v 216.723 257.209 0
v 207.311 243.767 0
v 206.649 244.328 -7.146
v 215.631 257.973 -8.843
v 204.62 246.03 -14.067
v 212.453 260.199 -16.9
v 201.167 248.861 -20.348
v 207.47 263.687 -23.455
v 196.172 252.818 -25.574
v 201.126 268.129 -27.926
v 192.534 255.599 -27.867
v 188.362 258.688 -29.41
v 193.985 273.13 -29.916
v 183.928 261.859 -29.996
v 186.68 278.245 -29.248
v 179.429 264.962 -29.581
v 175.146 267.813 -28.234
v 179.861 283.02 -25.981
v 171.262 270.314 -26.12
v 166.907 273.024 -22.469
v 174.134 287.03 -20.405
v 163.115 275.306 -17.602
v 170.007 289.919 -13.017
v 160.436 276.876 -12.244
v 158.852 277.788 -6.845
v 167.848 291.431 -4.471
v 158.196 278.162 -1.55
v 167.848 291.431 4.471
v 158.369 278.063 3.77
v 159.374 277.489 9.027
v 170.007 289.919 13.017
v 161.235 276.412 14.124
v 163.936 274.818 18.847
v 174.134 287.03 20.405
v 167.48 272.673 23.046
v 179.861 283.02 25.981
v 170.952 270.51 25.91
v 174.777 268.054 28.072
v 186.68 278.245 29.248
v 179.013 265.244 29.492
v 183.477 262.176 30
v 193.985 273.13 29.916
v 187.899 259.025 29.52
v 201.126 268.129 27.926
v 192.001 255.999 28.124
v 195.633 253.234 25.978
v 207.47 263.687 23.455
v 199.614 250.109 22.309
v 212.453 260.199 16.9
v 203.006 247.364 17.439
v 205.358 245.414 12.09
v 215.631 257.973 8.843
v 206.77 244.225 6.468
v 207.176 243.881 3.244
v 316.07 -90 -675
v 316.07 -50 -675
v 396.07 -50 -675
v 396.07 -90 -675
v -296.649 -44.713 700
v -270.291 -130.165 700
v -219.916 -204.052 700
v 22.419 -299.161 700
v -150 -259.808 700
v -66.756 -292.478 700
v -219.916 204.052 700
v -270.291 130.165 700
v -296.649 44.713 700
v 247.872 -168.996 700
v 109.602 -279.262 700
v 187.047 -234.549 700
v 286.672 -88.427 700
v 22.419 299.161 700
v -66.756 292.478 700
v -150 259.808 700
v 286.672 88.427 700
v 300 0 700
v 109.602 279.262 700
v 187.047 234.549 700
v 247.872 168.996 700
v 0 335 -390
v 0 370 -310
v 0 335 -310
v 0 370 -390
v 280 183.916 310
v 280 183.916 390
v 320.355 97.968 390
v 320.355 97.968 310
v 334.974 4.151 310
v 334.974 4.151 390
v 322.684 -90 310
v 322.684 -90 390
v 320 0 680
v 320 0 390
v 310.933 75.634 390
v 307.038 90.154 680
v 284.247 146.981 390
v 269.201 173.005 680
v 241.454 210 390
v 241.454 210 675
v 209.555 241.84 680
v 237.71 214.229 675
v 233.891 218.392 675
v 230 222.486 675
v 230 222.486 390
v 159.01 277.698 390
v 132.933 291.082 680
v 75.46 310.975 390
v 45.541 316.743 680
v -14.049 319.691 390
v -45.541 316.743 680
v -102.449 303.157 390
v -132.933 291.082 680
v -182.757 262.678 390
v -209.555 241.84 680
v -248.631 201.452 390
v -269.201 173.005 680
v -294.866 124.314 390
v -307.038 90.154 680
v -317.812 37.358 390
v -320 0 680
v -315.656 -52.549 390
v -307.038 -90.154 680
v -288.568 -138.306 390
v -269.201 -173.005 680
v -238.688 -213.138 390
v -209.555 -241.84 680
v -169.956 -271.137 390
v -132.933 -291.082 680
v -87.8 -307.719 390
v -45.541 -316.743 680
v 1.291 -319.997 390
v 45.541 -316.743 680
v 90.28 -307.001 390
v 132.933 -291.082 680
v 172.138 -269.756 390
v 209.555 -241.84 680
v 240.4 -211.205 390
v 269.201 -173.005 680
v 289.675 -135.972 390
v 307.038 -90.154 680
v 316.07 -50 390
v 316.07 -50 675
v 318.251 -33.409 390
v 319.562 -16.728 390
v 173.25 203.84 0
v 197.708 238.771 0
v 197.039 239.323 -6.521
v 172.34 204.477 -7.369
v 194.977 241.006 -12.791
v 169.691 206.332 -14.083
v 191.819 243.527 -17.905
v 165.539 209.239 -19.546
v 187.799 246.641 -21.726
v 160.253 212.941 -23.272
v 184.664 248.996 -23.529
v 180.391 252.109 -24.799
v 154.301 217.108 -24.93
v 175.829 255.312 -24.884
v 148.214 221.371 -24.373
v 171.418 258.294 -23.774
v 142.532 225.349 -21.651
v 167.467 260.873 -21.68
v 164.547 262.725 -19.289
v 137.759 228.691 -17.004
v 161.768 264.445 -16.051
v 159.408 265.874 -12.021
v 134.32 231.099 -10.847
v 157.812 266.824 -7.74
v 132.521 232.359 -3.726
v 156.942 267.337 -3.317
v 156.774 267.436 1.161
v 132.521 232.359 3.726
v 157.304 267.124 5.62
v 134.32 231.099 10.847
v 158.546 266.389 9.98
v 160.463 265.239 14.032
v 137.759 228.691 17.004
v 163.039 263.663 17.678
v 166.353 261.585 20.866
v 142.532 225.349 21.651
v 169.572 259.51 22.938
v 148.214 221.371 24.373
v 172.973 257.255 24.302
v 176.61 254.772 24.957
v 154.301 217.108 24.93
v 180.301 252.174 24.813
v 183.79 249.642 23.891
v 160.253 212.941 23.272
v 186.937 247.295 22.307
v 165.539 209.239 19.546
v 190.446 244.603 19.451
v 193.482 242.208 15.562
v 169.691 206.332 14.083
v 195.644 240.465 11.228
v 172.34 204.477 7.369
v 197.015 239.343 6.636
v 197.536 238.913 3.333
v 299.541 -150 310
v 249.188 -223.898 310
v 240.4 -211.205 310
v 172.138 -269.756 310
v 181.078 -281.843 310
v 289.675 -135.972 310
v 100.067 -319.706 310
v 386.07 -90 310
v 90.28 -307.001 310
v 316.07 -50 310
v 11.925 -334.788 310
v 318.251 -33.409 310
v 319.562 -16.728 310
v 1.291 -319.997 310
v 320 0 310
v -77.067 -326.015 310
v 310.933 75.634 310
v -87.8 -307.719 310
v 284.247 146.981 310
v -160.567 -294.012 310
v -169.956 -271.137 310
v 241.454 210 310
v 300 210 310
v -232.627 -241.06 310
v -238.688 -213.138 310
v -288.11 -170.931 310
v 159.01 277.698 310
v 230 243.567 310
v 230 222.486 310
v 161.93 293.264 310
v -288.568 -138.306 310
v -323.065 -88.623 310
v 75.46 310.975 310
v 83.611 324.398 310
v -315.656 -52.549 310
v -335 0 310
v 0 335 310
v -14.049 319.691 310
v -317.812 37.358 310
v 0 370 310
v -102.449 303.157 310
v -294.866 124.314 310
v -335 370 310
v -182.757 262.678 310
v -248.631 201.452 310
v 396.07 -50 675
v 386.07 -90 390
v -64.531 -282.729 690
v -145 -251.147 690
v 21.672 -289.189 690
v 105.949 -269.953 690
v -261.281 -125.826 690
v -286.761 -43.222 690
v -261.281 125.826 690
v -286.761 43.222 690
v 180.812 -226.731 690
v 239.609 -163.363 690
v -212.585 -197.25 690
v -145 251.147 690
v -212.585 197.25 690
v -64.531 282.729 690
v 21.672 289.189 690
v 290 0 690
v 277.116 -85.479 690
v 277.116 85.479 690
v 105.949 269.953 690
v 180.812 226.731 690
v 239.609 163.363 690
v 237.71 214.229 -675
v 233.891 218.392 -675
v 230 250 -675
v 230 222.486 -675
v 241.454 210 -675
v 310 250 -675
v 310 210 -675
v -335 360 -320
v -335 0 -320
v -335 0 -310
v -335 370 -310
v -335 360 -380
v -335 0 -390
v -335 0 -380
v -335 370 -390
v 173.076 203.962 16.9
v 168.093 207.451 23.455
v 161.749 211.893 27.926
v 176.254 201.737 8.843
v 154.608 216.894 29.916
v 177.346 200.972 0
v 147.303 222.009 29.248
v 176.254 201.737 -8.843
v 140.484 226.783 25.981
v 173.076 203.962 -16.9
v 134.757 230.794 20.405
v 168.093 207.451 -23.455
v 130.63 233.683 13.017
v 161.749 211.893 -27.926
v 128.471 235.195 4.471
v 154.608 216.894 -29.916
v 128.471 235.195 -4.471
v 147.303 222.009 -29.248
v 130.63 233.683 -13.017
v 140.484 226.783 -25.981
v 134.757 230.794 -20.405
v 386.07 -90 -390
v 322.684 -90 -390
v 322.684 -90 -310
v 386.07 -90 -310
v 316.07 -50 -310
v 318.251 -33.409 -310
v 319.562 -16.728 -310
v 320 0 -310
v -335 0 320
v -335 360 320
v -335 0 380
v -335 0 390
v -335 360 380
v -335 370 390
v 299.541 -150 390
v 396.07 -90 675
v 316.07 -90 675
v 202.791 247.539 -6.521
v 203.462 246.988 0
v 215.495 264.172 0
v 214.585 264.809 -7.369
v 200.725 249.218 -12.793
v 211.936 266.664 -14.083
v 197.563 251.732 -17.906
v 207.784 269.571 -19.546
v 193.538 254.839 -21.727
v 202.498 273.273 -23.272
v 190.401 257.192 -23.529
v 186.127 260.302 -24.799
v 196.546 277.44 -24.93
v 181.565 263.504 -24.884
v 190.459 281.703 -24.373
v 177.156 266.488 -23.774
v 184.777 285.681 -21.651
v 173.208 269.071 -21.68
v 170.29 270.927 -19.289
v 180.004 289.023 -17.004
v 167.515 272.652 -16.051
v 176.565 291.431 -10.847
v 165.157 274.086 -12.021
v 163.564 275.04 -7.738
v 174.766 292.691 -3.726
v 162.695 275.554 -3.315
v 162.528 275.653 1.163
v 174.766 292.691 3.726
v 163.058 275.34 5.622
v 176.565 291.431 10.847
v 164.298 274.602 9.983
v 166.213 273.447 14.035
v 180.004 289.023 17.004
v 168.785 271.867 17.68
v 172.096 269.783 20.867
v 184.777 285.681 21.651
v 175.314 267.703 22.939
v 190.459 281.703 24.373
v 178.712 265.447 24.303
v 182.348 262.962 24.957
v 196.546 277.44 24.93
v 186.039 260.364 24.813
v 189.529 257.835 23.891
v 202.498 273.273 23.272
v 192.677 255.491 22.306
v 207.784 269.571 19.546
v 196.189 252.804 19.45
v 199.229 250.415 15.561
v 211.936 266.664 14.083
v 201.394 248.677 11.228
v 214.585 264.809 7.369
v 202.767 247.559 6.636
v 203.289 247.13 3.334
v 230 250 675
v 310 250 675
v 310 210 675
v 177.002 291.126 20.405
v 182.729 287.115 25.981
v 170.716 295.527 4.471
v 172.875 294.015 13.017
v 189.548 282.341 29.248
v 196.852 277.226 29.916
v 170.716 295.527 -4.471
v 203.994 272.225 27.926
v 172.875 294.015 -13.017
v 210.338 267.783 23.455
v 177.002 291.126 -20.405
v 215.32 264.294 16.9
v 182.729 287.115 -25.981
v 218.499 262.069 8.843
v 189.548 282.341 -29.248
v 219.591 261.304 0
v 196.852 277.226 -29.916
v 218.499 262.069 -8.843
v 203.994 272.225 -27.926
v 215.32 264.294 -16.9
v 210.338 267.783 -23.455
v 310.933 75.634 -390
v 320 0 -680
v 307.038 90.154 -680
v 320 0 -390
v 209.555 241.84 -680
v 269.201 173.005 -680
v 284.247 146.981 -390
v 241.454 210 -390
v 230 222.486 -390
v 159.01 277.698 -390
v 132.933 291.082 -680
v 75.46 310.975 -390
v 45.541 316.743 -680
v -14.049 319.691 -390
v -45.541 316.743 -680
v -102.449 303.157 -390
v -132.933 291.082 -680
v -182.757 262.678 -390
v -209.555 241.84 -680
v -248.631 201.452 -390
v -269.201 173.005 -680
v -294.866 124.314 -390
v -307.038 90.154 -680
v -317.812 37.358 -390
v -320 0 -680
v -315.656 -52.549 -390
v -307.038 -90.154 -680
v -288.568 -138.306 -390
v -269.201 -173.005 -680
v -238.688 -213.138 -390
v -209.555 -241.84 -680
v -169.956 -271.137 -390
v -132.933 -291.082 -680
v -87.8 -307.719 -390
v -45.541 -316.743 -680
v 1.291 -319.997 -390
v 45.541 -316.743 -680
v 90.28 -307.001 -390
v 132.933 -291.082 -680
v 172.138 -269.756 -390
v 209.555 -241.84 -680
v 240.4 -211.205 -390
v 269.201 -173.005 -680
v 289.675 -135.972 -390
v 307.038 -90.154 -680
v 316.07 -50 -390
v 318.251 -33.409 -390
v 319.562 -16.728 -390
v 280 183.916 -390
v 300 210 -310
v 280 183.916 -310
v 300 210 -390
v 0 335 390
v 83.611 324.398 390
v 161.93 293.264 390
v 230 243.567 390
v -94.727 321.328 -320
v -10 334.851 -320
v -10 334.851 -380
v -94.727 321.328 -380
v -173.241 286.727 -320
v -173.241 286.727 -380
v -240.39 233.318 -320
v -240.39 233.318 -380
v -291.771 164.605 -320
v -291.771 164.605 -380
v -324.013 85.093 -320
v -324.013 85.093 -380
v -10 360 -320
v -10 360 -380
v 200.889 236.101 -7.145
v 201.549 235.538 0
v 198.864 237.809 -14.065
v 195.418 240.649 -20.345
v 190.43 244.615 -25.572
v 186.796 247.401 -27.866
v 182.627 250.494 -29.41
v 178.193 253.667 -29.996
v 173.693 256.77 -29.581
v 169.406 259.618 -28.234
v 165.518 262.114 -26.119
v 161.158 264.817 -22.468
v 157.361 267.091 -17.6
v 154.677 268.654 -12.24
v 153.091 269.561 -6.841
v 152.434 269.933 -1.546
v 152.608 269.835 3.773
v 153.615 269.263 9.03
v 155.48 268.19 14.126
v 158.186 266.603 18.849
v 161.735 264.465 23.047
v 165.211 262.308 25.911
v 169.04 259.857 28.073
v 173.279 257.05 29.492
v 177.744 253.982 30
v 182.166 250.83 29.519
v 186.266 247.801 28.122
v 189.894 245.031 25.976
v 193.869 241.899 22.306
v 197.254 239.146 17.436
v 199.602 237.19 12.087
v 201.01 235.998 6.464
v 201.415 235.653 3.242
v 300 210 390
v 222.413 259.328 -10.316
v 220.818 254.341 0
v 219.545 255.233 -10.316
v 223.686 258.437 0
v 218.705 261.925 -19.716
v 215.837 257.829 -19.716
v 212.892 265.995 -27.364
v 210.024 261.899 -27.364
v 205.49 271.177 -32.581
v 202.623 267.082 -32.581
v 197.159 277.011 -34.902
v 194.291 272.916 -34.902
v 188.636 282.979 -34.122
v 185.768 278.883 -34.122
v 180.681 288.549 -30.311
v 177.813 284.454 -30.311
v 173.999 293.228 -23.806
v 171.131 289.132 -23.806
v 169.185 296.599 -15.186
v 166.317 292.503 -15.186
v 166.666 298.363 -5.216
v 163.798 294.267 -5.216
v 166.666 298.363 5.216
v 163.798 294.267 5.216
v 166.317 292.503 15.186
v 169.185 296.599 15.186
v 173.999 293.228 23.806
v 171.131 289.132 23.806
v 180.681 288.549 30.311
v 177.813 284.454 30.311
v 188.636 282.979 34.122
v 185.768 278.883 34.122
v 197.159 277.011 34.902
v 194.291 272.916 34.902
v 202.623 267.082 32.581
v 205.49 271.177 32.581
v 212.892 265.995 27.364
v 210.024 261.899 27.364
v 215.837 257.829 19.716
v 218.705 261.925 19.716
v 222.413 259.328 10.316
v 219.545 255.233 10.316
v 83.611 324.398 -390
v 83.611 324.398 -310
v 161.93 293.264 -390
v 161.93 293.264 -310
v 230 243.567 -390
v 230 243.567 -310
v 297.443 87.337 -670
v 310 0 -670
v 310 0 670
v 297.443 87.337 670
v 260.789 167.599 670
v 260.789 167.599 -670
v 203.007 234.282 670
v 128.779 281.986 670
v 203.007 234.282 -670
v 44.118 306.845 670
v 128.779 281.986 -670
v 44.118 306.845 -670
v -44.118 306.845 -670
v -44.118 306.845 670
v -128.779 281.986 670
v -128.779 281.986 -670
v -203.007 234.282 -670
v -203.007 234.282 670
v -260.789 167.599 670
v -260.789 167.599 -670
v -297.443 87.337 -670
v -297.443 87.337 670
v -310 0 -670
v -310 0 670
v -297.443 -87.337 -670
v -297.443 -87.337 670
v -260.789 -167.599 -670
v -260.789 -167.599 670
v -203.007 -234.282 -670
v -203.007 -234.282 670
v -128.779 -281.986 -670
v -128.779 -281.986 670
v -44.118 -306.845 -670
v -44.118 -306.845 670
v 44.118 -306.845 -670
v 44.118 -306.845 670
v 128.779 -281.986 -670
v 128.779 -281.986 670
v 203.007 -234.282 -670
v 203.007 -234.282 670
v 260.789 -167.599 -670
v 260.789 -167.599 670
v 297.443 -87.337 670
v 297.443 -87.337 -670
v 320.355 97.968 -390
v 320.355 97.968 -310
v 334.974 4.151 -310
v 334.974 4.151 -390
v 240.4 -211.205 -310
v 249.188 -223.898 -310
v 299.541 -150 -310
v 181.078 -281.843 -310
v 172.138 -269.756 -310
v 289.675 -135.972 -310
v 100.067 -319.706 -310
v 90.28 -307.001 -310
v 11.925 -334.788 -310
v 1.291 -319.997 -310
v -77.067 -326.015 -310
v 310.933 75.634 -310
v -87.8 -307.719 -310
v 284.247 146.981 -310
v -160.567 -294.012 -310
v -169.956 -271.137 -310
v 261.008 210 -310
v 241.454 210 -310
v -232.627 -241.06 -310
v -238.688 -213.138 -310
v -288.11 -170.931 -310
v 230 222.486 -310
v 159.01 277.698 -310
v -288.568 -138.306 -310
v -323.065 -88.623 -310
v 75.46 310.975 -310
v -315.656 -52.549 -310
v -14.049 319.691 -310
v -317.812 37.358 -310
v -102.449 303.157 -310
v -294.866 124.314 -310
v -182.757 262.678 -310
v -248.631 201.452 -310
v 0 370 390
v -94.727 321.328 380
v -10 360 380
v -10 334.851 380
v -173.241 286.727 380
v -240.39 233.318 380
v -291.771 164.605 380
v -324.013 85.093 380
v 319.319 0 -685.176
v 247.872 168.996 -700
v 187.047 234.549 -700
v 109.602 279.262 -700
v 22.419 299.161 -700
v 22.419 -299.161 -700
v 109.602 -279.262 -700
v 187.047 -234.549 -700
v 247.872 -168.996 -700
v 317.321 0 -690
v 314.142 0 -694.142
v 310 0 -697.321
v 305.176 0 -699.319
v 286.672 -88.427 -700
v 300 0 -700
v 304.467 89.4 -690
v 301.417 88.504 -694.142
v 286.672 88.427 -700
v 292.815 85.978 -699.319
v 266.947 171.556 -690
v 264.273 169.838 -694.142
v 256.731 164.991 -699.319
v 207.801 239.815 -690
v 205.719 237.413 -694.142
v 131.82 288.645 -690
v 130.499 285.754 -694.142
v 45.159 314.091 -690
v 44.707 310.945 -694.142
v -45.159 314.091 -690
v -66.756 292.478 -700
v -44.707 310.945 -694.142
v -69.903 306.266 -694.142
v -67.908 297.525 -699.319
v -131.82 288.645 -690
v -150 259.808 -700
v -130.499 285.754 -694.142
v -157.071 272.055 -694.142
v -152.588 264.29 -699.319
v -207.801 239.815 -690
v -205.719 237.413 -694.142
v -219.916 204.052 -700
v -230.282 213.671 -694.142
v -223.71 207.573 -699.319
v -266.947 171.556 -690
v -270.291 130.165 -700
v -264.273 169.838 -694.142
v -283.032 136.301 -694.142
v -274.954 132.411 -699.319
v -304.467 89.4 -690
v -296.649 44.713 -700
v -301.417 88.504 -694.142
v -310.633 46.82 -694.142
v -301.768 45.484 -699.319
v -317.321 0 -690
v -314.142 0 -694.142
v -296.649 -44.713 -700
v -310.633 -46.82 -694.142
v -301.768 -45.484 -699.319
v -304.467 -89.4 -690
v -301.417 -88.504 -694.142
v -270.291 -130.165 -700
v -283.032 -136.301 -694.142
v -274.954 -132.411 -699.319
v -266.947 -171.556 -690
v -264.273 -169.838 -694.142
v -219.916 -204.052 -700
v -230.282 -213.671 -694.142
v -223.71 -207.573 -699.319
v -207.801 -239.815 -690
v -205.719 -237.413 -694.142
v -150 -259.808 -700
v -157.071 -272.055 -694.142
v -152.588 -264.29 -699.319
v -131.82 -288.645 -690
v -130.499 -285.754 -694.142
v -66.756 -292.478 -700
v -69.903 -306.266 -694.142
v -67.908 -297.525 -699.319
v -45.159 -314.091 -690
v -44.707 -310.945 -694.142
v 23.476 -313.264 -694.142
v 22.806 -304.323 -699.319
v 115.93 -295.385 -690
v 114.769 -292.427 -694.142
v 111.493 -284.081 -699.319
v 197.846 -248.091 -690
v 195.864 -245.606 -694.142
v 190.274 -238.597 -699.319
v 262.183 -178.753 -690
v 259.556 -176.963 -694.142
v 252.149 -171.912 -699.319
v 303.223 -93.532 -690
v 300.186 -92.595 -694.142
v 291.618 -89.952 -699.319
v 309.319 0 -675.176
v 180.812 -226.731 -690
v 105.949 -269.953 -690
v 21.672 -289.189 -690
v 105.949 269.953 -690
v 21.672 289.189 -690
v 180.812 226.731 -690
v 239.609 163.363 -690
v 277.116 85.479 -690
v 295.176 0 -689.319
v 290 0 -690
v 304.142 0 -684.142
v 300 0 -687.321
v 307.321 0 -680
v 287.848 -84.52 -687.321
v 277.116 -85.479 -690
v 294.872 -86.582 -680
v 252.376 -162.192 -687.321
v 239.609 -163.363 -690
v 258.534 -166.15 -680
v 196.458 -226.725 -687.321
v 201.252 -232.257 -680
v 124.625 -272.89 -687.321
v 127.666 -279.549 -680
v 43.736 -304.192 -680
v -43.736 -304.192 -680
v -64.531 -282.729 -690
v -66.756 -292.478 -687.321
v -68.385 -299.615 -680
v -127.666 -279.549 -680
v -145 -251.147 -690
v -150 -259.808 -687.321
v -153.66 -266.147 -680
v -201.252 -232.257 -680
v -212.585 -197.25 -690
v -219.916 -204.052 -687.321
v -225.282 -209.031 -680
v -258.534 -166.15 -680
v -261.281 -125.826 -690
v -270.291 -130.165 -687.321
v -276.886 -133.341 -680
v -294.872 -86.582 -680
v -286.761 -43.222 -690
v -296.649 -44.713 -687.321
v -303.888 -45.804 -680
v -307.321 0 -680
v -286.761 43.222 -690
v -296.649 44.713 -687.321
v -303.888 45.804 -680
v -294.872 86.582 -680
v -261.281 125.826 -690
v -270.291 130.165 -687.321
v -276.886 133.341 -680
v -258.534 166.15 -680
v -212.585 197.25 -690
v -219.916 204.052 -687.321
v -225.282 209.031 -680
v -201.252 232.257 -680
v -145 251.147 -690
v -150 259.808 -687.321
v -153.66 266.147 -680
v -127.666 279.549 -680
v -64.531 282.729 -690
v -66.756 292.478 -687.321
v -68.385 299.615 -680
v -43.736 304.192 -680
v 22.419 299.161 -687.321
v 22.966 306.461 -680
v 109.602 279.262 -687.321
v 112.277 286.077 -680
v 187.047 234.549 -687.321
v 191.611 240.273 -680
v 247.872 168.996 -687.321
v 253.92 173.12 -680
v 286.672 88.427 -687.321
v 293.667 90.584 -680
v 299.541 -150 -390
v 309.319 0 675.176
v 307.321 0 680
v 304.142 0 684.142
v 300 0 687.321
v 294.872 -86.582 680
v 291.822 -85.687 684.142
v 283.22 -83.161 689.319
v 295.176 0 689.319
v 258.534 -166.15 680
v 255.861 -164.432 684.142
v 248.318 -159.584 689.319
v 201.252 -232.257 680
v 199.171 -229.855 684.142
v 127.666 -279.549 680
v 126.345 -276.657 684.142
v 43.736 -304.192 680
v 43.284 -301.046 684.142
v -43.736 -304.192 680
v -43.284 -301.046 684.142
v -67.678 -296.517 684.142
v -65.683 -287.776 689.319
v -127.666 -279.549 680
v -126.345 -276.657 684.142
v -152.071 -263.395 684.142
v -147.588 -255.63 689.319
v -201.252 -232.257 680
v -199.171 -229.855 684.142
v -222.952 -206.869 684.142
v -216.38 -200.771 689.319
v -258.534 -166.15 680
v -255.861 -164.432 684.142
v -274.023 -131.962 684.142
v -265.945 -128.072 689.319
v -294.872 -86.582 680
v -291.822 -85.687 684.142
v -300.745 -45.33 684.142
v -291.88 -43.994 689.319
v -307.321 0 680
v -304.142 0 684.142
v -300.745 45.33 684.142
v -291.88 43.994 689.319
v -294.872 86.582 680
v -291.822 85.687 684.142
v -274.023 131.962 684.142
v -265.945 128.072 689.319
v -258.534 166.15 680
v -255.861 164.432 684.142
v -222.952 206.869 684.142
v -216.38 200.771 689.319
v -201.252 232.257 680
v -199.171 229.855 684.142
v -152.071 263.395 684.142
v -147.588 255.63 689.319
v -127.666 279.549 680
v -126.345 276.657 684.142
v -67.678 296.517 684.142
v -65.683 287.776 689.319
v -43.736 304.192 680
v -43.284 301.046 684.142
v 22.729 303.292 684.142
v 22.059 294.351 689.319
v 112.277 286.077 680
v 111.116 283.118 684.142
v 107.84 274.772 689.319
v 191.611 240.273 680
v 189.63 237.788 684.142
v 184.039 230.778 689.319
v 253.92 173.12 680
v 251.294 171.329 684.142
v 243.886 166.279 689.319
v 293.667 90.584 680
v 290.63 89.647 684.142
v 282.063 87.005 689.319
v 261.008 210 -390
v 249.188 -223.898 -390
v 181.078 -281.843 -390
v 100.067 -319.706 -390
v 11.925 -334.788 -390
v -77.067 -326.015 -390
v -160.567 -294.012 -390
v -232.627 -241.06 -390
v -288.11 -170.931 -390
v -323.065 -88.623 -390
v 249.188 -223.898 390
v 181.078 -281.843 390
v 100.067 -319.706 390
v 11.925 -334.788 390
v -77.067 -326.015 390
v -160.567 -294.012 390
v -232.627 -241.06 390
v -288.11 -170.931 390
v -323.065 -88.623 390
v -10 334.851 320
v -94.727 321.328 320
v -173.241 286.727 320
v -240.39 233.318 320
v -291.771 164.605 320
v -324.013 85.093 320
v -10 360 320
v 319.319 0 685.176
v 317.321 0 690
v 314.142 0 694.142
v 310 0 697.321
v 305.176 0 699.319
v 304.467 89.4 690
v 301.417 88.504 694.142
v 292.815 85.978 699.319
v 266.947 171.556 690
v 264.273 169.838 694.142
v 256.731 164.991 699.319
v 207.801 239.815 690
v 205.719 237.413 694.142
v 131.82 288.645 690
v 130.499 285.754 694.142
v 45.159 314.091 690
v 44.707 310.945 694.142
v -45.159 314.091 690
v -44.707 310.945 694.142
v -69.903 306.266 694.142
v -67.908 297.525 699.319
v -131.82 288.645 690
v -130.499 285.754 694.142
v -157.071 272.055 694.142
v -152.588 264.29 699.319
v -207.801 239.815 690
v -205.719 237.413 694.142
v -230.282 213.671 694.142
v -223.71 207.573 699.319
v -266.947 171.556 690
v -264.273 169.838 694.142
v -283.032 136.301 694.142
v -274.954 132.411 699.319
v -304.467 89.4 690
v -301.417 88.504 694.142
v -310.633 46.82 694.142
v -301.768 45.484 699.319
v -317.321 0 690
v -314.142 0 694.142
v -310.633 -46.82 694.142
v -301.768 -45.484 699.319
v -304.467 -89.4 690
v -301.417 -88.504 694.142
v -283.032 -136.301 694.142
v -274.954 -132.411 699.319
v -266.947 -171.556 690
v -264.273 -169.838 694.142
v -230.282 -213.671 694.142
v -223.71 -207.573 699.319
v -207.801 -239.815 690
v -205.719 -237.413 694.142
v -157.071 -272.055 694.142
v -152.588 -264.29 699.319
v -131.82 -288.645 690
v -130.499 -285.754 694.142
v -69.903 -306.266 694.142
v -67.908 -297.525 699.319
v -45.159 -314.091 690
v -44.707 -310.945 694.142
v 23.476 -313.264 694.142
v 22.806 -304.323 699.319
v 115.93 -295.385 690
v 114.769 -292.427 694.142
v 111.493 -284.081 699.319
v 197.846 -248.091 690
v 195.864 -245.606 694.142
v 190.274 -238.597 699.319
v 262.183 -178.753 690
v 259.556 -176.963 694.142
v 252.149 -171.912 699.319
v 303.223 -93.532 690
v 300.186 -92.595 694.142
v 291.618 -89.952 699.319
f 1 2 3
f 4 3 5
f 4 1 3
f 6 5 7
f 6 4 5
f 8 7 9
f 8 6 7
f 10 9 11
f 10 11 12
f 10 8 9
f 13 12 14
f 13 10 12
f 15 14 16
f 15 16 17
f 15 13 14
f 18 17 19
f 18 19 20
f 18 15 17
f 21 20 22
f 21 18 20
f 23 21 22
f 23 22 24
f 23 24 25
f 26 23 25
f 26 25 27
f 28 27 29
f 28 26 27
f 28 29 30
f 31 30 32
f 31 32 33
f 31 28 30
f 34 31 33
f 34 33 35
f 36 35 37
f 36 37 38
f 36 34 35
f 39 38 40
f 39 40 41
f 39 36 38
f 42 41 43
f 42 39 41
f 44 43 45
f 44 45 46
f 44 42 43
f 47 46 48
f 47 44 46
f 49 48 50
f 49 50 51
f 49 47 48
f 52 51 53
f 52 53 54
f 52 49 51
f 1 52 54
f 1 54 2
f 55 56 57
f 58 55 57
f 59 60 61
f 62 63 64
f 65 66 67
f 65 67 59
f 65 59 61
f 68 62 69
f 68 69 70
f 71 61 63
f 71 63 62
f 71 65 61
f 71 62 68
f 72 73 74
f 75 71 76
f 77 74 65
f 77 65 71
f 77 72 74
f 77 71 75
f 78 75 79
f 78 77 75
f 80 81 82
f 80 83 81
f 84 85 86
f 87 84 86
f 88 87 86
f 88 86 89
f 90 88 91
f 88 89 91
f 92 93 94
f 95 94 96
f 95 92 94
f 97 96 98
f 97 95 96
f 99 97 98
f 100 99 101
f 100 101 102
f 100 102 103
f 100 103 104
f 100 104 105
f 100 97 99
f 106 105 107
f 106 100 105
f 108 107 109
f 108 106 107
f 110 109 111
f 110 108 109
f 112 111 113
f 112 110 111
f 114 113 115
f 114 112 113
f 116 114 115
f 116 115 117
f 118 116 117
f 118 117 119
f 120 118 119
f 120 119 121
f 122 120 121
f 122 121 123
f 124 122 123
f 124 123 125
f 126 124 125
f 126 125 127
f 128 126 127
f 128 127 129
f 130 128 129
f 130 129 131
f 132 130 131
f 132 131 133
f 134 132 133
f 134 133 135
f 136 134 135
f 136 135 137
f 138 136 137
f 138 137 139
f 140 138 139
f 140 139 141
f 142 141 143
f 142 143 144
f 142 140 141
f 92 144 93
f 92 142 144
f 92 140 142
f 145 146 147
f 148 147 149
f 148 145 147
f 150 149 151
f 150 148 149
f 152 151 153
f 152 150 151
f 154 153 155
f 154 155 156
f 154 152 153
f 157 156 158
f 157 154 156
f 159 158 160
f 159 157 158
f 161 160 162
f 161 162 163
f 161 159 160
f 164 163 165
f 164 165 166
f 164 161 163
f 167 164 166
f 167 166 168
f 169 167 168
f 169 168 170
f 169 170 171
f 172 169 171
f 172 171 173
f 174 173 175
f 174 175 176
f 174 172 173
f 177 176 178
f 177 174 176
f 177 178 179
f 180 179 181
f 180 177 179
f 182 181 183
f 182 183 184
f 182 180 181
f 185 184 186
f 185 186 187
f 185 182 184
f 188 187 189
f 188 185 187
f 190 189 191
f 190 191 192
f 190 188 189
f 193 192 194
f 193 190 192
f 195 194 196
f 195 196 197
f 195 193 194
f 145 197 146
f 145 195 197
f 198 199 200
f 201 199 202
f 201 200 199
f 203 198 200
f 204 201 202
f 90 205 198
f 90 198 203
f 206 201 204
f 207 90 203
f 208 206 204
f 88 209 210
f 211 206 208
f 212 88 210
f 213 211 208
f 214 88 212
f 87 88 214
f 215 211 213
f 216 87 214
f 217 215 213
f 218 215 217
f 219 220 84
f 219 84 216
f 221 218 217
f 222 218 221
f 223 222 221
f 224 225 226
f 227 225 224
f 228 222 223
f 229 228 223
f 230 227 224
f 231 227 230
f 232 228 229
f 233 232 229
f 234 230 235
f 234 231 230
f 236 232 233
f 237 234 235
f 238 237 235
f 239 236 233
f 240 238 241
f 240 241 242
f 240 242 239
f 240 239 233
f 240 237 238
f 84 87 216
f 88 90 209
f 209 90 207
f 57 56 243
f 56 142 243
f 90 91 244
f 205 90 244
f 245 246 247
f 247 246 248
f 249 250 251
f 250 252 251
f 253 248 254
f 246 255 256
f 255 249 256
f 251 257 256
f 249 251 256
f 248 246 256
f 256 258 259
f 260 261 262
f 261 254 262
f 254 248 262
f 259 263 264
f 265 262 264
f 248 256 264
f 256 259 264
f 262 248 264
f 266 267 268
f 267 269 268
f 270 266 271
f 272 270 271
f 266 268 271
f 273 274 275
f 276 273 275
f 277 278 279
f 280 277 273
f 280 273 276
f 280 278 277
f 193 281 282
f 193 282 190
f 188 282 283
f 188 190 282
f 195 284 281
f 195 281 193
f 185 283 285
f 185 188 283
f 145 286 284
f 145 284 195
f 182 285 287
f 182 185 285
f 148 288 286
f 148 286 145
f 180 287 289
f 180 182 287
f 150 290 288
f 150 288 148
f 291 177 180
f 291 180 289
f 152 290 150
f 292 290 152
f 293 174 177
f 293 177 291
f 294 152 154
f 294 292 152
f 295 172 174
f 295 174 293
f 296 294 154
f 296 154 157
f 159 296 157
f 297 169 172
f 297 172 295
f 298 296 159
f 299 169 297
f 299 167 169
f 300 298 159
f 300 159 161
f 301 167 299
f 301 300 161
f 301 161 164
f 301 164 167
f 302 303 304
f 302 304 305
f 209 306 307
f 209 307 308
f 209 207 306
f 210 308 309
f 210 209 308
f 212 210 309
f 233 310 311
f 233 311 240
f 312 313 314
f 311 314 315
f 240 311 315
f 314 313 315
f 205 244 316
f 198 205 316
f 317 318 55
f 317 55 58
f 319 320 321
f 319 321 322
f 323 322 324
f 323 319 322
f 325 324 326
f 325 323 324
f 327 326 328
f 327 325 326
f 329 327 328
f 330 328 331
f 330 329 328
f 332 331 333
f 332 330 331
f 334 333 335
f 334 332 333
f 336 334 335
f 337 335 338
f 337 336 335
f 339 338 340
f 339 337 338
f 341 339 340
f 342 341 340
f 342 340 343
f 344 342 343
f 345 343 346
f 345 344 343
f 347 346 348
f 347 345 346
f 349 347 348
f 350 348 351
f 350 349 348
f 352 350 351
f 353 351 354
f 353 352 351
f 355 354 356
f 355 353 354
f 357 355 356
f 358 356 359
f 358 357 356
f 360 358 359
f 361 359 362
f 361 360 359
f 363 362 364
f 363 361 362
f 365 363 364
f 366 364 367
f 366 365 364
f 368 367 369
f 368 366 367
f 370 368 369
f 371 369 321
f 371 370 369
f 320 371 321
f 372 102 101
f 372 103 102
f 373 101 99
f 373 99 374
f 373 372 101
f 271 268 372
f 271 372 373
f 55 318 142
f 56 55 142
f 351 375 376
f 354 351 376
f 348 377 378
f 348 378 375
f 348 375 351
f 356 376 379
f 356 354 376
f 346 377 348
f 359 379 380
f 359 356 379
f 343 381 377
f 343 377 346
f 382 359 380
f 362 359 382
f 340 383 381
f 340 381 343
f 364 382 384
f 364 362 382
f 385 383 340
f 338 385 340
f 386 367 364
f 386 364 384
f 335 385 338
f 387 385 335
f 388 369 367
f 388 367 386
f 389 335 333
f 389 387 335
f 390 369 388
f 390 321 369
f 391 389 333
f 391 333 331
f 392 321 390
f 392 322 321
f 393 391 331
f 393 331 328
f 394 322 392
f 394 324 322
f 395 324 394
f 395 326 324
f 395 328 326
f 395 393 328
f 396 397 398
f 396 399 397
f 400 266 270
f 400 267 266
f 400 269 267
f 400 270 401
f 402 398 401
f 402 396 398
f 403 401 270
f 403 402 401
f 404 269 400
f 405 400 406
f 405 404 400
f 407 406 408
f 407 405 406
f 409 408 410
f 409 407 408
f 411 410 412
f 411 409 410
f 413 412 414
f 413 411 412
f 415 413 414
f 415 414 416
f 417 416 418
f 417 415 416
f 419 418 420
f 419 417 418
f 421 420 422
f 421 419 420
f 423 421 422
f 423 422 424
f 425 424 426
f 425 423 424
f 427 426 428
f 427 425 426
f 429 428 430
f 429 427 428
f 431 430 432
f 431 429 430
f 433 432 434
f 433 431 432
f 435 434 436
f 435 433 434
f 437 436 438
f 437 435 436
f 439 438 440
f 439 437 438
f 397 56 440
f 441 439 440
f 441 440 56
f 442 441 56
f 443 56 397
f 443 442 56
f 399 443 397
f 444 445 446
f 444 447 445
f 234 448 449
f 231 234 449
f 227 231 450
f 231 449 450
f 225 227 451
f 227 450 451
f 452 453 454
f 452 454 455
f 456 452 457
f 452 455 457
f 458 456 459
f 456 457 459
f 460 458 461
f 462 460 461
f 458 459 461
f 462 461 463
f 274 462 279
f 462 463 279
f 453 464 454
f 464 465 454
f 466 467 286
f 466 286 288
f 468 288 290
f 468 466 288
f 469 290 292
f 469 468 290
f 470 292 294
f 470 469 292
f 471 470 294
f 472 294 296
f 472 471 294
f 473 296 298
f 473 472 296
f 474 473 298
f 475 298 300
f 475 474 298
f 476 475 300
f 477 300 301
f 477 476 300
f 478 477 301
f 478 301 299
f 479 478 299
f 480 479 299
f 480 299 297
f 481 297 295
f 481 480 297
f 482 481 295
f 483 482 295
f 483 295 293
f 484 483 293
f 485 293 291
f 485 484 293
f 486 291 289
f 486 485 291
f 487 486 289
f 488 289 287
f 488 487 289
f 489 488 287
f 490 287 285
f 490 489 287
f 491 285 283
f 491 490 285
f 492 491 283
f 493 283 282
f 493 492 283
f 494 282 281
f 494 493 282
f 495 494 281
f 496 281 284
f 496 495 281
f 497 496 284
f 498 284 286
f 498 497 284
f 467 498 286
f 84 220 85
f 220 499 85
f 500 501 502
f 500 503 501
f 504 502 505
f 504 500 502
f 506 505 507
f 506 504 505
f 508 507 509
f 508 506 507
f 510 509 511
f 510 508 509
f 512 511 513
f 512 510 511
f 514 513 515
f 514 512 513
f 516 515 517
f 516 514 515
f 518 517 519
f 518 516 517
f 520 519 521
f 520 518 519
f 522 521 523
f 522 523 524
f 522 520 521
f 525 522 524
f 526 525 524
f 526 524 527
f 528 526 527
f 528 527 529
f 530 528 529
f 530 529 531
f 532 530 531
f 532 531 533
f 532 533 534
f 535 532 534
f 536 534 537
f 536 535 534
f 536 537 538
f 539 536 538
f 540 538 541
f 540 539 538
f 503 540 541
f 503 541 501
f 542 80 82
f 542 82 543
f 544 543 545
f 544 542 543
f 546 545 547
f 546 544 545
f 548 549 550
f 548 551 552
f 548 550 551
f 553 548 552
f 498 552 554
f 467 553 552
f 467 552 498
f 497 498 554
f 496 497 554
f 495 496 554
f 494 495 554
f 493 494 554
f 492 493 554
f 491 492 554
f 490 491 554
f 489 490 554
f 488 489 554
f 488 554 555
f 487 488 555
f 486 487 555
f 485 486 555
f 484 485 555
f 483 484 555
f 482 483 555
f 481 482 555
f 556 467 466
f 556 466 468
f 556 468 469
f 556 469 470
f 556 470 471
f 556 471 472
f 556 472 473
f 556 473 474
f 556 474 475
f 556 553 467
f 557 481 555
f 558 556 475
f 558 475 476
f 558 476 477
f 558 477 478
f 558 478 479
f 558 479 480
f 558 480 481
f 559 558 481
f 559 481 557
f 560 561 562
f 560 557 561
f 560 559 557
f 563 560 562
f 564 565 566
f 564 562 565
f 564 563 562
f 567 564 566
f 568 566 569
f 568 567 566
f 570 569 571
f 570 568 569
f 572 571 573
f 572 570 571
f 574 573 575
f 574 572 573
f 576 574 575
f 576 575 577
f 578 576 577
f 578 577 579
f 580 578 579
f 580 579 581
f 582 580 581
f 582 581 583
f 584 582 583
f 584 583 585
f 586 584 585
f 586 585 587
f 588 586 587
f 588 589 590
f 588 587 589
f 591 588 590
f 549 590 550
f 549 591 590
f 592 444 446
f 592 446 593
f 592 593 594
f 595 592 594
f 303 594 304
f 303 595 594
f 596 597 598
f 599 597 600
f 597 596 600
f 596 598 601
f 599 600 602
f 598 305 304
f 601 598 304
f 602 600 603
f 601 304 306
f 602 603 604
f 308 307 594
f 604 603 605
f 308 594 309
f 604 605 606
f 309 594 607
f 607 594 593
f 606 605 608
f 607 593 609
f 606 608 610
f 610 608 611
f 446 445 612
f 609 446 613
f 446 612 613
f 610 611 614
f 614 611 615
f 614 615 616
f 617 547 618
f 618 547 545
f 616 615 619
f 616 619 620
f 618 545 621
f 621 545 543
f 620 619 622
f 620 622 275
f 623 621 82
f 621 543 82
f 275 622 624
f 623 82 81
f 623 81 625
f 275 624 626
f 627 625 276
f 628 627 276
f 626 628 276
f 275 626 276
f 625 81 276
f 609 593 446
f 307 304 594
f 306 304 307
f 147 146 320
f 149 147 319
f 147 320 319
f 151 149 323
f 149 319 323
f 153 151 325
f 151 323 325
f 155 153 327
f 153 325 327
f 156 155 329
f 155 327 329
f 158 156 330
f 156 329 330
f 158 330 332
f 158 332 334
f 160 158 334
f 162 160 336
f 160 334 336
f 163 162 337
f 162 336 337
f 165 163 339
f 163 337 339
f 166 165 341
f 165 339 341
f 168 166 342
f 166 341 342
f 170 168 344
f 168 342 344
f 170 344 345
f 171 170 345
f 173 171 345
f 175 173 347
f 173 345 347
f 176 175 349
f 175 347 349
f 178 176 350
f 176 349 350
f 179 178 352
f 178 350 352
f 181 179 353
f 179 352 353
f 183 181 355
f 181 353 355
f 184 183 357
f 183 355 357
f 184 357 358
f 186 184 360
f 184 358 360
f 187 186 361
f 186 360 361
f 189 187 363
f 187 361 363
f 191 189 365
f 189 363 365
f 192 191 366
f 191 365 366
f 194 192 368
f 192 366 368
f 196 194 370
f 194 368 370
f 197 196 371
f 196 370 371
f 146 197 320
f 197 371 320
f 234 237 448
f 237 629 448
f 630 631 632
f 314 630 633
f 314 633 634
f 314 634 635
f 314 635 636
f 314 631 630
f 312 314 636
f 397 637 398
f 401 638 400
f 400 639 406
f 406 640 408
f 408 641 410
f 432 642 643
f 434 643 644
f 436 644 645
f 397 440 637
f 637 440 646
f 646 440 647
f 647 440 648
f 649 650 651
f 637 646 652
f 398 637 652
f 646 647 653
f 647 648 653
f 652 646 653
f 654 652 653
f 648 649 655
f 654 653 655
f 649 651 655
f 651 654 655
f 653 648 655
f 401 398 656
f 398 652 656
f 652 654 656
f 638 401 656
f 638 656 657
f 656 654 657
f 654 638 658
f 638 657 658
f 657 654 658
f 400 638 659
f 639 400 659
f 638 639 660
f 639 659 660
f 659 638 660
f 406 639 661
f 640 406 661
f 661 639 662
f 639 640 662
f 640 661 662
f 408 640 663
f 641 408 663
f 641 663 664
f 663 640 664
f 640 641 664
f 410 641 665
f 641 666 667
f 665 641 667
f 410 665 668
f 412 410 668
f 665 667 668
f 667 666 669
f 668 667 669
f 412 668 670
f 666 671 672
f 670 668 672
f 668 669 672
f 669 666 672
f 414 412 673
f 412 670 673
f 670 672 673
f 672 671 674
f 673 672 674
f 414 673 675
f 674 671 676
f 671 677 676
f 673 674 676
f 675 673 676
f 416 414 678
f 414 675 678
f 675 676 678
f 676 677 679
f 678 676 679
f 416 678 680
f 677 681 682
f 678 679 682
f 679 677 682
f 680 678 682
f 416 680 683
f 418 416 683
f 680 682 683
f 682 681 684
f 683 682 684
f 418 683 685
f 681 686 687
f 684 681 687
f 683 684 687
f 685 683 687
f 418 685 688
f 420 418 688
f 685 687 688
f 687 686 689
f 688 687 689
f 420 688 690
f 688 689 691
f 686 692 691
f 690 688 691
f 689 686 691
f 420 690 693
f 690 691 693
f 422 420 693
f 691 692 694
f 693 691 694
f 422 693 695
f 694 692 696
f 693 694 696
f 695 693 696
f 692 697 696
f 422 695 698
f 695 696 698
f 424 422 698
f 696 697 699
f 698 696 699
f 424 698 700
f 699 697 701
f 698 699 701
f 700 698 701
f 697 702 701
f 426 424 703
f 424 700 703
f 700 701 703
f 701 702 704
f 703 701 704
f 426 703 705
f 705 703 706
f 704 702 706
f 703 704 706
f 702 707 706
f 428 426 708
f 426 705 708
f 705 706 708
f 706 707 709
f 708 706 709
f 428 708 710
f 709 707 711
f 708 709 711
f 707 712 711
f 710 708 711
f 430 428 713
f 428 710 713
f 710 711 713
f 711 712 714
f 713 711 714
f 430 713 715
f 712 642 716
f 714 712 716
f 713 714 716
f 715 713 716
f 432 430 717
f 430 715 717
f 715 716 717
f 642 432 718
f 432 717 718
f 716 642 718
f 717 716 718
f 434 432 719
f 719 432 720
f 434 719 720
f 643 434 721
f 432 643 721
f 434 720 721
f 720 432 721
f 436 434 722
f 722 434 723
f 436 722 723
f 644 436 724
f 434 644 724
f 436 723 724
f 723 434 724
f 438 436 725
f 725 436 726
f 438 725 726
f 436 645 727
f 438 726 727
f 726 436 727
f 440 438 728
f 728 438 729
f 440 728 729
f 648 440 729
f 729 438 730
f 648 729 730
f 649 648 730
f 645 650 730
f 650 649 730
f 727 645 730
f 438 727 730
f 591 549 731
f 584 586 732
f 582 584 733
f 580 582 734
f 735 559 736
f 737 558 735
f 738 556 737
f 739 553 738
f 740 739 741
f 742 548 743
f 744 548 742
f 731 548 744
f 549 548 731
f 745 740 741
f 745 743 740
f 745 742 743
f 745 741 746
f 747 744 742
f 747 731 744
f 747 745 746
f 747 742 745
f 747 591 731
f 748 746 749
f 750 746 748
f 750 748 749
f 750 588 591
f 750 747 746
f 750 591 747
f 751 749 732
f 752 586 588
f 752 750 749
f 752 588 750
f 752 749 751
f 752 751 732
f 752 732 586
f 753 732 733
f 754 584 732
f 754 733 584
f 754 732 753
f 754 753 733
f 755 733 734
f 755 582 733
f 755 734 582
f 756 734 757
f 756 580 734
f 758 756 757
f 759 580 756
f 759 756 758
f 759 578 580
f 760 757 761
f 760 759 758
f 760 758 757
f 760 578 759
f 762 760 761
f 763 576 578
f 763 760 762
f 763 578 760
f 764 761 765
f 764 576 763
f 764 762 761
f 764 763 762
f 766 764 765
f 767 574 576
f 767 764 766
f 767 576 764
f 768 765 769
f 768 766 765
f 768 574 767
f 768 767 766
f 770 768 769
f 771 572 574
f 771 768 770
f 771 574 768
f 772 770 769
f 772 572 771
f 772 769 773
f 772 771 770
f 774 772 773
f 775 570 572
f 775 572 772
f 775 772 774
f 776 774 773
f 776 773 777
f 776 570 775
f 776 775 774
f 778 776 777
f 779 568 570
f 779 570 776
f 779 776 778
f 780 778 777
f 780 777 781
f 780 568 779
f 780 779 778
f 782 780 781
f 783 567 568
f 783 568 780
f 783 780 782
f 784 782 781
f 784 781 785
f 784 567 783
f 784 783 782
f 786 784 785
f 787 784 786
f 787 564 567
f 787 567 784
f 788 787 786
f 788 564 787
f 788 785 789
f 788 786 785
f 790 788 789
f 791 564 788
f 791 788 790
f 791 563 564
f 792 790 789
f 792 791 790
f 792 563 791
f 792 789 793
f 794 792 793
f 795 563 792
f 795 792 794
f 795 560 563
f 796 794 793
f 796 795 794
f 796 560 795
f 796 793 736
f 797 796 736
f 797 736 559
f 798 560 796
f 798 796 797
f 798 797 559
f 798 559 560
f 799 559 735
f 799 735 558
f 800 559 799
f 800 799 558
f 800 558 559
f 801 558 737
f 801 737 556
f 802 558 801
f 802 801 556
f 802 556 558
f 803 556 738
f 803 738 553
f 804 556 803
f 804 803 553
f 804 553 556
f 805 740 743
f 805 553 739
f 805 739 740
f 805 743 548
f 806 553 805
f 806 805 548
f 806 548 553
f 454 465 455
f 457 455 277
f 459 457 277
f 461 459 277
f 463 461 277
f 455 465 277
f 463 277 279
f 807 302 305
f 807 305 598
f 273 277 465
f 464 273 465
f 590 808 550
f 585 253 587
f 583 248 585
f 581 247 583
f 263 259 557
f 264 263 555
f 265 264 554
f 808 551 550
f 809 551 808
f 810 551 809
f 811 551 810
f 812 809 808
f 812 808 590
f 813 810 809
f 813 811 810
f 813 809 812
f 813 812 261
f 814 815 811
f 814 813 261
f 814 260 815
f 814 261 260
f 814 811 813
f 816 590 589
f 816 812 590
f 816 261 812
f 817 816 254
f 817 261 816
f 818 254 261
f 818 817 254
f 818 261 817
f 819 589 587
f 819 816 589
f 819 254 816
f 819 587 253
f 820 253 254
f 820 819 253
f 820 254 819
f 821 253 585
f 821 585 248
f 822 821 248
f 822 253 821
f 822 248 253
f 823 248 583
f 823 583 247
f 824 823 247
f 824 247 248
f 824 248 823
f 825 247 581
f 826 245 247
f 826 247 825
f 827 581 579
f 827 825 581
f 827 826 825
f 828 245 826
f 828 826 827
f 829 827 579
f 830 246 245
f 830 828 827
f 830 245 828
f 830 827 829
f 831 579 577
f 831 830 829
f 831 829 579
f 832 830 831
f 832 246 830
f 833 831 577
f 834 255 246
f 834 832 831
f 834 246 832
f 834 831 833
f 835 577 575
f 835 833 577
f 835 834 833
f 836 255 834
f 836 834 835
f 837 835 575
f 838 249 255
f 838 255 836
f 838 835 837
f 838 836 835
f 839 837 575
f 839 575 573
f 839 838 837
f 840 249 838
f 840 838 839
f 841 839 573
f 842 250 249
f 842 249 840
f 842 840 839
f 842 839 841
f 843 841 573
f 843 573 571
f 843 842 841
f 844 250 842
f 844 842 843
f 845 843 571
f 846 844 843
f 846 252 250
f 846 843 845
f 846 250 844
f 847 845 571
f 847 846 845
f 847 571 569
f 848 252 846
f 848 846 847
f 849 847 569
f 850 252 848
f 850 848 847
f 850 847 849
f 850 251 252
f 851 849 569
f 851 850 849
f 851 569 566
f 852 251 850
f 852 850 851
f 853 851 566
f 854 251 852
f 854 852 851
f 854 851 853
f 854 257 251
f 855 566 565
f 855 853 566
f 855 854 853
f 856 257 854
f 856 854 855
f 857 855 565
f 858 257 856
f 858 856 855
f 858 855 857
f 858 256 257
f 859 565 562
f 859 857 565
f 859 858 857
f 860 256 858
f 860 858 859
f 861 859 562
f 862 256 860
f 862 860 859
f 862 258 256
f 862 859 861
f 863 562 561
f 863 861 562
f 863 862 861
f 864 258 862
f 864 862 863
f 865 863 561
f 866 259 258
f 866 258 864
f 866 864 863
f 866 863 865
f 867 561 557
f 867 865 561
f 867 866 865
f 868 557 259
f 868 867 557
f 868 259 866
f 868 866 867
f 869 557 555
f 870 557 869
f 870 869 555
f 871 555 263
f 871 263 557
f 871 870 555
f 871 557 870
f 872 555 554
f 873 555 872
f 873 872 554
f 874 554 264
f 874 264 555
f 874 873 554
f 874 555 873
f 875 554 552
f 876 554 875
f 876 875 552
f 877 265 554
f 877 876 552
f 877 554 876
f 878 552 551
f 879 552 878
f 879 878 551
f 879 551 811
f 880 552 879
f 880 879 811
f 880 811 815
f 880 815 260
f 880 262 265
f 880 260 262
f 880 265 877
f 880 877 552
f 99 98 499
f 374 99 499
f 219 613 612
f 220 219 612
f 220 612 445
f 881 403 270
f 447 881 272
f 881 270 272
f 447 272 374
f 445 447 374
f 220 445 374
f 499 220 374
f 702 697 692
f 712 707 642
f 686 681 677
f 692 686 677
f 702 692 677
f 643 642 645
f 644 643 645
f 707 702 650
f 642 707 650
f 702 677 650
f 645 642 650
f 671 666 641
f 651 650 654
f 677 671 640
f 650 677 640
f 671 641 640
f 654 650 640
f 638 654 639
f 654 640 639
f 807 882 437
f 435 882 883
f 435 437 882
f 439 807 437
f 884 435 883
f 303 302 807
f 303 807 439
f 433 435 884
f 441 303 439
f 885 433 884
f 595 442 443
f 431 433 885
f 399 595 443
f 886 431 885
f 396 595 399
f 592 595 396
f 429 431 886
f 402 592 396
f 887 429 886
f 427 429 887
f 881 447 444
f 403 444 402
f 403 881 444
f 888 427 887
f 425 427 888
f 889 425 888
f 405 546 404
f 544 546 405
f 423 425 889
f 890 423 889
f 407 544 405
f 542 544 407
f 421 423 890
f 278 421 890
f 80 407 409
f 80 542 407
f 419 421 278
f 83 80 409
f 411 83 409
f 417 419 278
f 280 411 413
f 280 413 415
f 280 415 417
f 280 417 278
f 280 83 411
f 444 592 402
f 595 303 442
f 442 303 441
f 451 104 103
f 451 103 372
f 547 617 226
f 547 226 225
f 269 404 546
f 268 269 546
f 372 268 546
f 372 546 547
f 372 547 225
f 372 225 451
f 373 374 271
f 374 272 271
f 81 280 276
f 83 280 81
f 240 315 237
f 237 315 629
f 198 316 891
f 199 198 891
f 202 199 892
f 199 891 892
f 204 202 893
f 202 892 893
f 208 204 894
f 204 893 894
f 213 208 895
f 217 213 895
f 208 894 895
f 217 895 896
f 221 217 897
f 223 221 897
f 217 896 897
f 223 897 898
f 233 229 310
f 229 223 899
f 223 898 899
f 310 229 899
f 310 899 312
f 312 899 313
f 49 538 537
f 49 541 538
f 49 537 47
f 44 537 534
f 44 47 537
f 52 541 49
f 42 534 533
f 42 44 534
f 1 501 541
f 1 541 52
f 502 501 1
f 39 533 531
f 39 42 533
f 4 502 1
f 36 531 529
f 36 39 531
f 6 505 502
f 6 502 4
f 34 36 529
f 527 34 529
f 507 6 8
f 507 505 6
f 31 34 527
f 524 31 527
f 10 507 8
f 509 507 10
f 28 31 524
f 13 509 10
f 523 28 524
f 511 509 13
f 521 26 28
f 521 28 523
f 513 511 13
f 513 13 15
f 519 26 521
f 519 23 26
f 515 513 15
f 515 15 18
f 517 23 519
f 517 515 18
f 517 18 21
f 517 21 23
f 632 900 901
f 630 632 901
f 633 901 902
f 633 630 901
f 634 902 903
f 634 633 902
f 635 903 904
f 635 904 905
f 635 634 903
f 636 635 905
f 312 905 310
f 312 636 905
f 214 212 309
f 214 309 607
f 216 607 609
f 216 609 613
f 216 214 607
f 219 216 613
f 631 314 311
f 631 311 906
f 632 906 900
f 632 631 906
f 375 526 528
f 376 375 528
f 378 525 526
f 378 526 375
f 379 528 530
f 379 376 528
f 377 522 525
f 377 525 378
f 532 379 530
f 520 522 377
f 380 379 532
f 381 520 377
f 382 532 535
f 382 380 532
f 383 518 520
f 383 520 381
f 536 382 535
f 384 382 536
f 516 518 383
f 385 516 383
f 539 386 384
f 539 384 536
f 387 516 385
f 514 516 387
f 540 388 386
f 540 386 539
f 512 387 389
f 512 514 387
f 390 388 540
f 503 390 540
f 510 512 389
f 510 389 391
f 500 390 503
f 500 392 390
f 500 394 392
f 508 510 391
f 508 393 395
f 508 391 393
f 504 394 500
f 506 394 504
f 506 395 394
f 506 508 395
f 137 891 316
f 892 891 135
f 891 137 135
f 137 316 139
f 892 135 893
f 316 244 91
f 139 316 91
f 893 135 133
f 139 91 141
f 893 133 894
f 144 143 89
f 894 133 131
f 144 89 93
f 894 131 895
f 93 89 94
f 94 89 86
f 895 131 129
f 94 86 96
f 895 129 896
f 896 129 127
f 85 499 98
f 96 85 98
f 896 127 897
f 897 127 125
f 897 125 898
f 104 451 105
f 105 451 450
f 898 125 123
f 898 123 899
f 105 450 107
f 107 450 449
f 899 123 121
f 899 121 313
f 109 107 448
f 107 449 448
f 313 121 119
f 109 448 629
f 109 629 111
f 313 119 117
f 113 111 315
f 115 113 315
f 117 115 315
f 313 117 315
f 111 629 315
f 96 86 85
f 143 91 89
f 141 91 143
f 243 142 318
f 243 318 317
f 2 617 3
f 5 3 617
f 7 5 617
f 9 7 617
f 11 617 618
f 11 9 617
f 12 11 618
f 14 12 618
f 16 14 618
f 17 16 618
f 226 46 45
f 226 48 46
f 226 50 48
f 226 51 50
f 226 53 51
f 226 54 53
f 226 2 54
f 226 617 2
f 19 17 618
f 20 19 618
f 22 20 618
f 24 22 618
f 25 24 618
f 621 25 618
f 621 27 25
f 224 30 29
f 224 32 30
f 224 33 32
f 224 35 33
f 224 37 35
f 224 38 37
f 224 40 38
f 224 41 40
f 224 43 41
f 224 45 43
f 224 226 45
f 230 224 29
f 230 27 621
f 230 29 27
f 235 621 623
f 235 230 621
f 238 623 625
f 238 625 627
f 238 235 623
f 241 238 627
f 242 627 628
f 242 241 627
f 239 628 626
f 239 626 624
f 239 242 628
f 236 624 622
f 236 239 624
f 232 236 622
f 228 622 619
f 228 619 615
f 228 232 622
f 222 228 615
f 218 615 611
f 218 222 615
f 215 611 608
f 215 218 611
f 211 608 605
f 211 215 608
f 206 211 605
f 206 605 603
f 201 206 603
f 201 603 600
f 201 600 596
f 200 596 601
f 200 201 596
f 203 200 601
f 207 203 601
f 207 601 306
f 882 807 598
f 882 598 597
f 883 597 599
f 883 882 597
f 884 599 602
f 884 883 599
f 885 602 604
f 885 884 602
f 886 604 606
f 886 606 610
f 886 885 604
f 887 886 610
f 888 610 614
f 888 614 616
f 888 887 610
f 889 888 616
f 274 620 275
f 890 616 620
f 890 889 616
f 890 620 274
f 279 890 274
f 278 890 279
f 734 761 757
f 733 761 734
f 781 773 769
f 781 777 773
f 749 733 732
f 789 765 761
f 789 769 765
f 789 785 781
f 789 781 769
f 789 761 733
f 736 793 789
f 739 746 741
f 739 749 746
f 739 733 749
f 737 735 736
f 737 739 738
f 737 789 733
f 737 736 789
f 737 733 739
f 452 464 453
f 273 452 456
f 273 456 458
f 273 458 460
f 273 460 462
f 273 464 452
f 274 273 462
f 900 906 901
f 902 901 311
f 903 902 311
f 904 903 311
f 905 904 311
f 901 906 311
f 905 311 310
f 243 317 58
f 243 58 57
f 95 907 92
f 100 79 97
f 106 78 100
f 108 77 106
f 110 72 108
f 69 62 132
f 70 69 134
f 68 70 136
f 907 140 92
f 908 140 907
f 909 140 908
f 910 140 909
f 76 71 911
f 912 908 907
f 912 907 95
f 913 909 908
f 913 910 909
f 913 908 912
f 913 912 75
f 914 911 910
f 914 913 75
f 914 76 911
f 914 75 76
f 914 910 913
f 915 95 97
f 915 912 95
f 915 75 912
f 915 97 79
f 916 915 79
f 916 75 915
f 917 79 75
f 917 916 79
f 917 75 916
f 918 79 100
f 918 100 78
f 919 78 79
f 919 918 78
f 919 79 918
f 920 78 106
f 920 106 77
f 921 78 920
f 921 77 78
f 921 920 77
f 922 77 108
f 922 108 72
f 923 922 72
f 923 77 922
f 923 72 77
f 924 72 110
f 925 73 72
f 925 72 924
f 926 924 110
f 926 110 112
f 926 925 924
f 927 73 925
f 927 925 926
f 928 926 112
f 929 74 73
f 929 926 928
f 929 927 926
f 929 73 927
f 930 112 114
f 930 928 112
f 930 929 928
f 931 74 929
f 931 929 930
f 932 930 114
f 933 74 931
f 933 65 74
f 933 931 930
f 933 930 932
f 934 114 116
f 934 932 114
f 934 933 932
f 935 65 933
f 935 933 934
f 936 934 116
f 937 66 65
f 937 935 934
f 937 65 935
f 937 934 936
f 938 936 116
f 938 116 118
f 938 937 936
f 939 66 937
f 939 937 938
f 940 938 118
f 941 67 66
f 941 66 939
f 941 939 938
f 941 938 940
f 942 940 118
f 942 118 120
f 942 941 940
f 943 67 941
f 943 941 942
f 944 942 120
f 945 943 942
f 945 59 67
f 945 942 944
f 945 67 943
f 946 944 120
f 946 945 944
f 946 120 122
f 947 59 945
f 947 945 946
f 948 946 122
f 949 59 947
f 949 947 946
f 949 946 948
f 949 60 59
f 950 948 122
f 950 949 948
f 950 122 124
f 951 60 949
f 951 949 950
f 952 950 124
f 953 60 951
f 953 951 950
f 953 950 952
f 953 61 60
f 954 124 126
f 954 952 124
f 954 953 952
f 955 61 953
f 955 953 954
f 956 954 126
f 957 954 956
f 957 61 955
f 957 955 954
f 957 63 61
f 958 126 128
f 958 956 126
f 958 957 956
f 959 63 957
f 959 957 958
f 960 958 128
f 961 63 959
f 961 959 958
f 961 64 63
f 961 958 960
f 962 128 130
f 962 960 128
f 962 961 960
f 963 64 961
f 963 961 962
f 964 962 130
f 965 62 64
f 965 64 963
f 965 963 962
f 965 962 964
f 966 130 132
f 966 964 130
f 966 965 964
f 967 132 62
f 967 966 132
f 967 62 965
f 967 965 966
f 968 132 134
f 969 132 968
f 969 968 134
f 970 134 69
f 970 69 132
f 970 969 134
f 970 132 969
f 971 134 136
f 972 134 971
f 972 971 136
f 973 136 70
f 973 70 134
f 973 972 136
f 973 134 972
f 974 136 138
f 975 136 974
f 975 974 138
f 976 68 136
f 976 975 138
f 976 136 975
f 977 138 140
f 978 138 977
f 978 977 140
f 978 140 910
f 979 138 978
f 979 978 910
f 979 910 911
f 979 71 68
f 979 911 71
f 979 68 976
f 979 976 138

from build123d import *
from build123d.topology import SkipClean

# Parameters (mm, degrees)
SKETCH1_R           = 320
SKETCH1_R_2         = 310
BOSS_EXTRUDE1_DEPTH = 700
SKETCH2_R           = 320
BOSS_EXTRUDE2_DEPTH = 10
FILLET1_R           = 20
FILLET2_R           = 20
SKETCH3_W           = 80
SKETCH3_H           = 40
BOSS_EXTRUDE3_DEPTH = 675
SKETCH4_R           = 320
BOSS_EXTRUDE4_DEPTH = 40
CUT_EXTRUDE1_DEPTH  = 30


with BuildPart() as part:
    # Sketch1 → Boss-Extrude1 (new, symmetric)
    with BuildSketch(Plane.XY):
        Circle(SKETCH1_R)
        Circle(SKETCH1_R_2, mode=Mode.SUBTRACT)
    extrude(amount=BOSS_EXTRUDE1_DEPTH, both=True)

    # Sketch2 → Boss-Extrude2 (add)
    with BuildSketch(Plane.XY.offset(700)):
        Circle(SKETCH2_R)
    boss_extrude2 = extrude(amount=-BOSS_EXTRUDE2_DEPTH)

    # Fillet1
    fillet1_edges = [part.edges().sort_by_distance(p)[0] for p in [
        (-320, 0, 700),
        (-310, 0, 690),
    ]]
    fillet(fillet1_edges, radius=FILLET1_R)

    # Mirror1: Boss-Extrude2 across plane
    add(boss_extrude2.mirror(Plane.XY))

    # Fillet2
    fillet2_edges = [part.edges().sort_by_distance(p)[0] for p in [
        (-320, 0, -700),
        (-310, 0, -690),
    ]]
    fillet(fillet2_edges, radius=FILLET2_R)

    # Sketch3 → Boss-Extrude3 (add, symmetric)
    with BuildSketch(Plane.XY):
        with Locations((270, 230)):
            Rectangle(SKETCH3_W, SKETCH3_H)
        with Locations((356.069612586, -70)):
            Rectangle(SKETCH3_W, SKETCH3_H)
    extrude(amount=BOSS_EXTRUDE3_DEPTH, both=True)


with BuildPart() as boss_extrude3_piece_1:
    # of the separate pieces the step leaves, piece 1, a body of its own (boss_extrude3_pieces)
    add(part.part.solids().sort_by_distance((320, 0, -680))[0])

    # Sketch4 → Boss-Extrude4 (add, symmetric)
    with BuildSketch(Plane.XY.offset(350)):
        with BuildLine():
            Line((-335, 0), (-335, 370))
            Line((-335, 370), (0, 370))
            Line((0, 370), (0, 335))
            ThreePointArc((0, 335), (144.697961285, 302.138213406), (261.007662723, 210))
            Line((261.007662723, 210), (300, 210))
            Line((300, 210), (280, 183.915741577))
            ThreePointArc((280, 183.915741577), (331.005251033, 51.580265493), (322.684056005, -90))
            Line((322.684056005, -90), (386.069612586, -90))
            Line((386.069612586, -90), (299.541316015, -150))
            ThreePointArc((299.541316015, -150), (-77.067045924, -326.014831614), (-335, 0))
        make_face()
        Circle(SKETCH4_R, mode=Mode.SUBTRACT)
    boss_extrude4 = extrude(amount=BOSS_EXTRUDE4_DEPTH, both=True)

    # Sketch7 → Cut-Extrude1 (cut, symmetric)
    with SkipClean():  # the faces are left unmerged after this step: merging them gives an invalid solid
        with BuildSketch(Plane.XY.offset(350)):
            with BuildLine():
                Line((-335, 360), (-10, 360))
                Line((-10, 360), (-10, 334.850713005))
                ThreePointArc((-10, 334.850713005), (-240.390307625, 233.318451906), (-335, 0))
                Line((-335, 0), (-335, 360))
            make_face()
        cut_extrude1 = extrude(amount=CUT_EXTRUDE1_DEPTH, both=True, mode=Mode.SUBTRACT)

    # Mirror2: Boss-Extrude4 across plane
    with SkipClean():  # the faces are left unmerged after this step: merging them gives an invalid solid
        add(boss_extrude4.mirror(Plane.XY))

    # Mirror2 2: Cut-Extrude1 across plane
    with SkipClean():  # the faces are left unmerged after this step: merging them gives an invalid solid
        add(cut_extrude1.mirror(Plane.XY), mode=Mode.SUBTRACT)

    # Sketch5 → Cut-Revolve1 (revolve, cut)
    with SkipClean():  # the faces are left unmerged after this step: merging them gives an invalid solid
        with BuildSketch(Plane.XY):
            Polygon((174.537187252, 292.851105967), (132.292314558, 232.519175234), (152.771115666, 218.179764326), (195.015988359, 278.511695058), align=None)
        revolve(axis=Axis((0, 0, 0), (0.5735764363510472, 0.8191520442889911, 0)), mode=Mode.SUBTRACT)

    # Sketch5<3> → Revolve1 (revolve)
    with SkipClean():  # the faces are left unmerged after this step: merging them gives an invalid solid
        with BuildSketch(Plane.XY):
            Polygon((128.196554337, 235.387057416), (132.292314558, 232.519175234), (174.537187252, 292.851105967), (170.441427031, 295.718988149), (166.345666809, 298.586870331), (163.477784627, 294.491110109), (167.573544849, 291.623227927), align=None)
        revolve(axis=Axis((0, 0, 0), (0.5735764363510472, 0.8191520442889911, 0)))


with BuildPart() as boss_extrude3_piece_2:
    # of the separate pieces the step leaves, piece 2, a body of its own (boss_extrude3_pieces)
    add(part.part.solids().sort_by_distance((316.069612586, -90, -675))[0])


solid = Compound([boss_extrude3_piece_1.part, boss_extrude3_piece_2.part])
